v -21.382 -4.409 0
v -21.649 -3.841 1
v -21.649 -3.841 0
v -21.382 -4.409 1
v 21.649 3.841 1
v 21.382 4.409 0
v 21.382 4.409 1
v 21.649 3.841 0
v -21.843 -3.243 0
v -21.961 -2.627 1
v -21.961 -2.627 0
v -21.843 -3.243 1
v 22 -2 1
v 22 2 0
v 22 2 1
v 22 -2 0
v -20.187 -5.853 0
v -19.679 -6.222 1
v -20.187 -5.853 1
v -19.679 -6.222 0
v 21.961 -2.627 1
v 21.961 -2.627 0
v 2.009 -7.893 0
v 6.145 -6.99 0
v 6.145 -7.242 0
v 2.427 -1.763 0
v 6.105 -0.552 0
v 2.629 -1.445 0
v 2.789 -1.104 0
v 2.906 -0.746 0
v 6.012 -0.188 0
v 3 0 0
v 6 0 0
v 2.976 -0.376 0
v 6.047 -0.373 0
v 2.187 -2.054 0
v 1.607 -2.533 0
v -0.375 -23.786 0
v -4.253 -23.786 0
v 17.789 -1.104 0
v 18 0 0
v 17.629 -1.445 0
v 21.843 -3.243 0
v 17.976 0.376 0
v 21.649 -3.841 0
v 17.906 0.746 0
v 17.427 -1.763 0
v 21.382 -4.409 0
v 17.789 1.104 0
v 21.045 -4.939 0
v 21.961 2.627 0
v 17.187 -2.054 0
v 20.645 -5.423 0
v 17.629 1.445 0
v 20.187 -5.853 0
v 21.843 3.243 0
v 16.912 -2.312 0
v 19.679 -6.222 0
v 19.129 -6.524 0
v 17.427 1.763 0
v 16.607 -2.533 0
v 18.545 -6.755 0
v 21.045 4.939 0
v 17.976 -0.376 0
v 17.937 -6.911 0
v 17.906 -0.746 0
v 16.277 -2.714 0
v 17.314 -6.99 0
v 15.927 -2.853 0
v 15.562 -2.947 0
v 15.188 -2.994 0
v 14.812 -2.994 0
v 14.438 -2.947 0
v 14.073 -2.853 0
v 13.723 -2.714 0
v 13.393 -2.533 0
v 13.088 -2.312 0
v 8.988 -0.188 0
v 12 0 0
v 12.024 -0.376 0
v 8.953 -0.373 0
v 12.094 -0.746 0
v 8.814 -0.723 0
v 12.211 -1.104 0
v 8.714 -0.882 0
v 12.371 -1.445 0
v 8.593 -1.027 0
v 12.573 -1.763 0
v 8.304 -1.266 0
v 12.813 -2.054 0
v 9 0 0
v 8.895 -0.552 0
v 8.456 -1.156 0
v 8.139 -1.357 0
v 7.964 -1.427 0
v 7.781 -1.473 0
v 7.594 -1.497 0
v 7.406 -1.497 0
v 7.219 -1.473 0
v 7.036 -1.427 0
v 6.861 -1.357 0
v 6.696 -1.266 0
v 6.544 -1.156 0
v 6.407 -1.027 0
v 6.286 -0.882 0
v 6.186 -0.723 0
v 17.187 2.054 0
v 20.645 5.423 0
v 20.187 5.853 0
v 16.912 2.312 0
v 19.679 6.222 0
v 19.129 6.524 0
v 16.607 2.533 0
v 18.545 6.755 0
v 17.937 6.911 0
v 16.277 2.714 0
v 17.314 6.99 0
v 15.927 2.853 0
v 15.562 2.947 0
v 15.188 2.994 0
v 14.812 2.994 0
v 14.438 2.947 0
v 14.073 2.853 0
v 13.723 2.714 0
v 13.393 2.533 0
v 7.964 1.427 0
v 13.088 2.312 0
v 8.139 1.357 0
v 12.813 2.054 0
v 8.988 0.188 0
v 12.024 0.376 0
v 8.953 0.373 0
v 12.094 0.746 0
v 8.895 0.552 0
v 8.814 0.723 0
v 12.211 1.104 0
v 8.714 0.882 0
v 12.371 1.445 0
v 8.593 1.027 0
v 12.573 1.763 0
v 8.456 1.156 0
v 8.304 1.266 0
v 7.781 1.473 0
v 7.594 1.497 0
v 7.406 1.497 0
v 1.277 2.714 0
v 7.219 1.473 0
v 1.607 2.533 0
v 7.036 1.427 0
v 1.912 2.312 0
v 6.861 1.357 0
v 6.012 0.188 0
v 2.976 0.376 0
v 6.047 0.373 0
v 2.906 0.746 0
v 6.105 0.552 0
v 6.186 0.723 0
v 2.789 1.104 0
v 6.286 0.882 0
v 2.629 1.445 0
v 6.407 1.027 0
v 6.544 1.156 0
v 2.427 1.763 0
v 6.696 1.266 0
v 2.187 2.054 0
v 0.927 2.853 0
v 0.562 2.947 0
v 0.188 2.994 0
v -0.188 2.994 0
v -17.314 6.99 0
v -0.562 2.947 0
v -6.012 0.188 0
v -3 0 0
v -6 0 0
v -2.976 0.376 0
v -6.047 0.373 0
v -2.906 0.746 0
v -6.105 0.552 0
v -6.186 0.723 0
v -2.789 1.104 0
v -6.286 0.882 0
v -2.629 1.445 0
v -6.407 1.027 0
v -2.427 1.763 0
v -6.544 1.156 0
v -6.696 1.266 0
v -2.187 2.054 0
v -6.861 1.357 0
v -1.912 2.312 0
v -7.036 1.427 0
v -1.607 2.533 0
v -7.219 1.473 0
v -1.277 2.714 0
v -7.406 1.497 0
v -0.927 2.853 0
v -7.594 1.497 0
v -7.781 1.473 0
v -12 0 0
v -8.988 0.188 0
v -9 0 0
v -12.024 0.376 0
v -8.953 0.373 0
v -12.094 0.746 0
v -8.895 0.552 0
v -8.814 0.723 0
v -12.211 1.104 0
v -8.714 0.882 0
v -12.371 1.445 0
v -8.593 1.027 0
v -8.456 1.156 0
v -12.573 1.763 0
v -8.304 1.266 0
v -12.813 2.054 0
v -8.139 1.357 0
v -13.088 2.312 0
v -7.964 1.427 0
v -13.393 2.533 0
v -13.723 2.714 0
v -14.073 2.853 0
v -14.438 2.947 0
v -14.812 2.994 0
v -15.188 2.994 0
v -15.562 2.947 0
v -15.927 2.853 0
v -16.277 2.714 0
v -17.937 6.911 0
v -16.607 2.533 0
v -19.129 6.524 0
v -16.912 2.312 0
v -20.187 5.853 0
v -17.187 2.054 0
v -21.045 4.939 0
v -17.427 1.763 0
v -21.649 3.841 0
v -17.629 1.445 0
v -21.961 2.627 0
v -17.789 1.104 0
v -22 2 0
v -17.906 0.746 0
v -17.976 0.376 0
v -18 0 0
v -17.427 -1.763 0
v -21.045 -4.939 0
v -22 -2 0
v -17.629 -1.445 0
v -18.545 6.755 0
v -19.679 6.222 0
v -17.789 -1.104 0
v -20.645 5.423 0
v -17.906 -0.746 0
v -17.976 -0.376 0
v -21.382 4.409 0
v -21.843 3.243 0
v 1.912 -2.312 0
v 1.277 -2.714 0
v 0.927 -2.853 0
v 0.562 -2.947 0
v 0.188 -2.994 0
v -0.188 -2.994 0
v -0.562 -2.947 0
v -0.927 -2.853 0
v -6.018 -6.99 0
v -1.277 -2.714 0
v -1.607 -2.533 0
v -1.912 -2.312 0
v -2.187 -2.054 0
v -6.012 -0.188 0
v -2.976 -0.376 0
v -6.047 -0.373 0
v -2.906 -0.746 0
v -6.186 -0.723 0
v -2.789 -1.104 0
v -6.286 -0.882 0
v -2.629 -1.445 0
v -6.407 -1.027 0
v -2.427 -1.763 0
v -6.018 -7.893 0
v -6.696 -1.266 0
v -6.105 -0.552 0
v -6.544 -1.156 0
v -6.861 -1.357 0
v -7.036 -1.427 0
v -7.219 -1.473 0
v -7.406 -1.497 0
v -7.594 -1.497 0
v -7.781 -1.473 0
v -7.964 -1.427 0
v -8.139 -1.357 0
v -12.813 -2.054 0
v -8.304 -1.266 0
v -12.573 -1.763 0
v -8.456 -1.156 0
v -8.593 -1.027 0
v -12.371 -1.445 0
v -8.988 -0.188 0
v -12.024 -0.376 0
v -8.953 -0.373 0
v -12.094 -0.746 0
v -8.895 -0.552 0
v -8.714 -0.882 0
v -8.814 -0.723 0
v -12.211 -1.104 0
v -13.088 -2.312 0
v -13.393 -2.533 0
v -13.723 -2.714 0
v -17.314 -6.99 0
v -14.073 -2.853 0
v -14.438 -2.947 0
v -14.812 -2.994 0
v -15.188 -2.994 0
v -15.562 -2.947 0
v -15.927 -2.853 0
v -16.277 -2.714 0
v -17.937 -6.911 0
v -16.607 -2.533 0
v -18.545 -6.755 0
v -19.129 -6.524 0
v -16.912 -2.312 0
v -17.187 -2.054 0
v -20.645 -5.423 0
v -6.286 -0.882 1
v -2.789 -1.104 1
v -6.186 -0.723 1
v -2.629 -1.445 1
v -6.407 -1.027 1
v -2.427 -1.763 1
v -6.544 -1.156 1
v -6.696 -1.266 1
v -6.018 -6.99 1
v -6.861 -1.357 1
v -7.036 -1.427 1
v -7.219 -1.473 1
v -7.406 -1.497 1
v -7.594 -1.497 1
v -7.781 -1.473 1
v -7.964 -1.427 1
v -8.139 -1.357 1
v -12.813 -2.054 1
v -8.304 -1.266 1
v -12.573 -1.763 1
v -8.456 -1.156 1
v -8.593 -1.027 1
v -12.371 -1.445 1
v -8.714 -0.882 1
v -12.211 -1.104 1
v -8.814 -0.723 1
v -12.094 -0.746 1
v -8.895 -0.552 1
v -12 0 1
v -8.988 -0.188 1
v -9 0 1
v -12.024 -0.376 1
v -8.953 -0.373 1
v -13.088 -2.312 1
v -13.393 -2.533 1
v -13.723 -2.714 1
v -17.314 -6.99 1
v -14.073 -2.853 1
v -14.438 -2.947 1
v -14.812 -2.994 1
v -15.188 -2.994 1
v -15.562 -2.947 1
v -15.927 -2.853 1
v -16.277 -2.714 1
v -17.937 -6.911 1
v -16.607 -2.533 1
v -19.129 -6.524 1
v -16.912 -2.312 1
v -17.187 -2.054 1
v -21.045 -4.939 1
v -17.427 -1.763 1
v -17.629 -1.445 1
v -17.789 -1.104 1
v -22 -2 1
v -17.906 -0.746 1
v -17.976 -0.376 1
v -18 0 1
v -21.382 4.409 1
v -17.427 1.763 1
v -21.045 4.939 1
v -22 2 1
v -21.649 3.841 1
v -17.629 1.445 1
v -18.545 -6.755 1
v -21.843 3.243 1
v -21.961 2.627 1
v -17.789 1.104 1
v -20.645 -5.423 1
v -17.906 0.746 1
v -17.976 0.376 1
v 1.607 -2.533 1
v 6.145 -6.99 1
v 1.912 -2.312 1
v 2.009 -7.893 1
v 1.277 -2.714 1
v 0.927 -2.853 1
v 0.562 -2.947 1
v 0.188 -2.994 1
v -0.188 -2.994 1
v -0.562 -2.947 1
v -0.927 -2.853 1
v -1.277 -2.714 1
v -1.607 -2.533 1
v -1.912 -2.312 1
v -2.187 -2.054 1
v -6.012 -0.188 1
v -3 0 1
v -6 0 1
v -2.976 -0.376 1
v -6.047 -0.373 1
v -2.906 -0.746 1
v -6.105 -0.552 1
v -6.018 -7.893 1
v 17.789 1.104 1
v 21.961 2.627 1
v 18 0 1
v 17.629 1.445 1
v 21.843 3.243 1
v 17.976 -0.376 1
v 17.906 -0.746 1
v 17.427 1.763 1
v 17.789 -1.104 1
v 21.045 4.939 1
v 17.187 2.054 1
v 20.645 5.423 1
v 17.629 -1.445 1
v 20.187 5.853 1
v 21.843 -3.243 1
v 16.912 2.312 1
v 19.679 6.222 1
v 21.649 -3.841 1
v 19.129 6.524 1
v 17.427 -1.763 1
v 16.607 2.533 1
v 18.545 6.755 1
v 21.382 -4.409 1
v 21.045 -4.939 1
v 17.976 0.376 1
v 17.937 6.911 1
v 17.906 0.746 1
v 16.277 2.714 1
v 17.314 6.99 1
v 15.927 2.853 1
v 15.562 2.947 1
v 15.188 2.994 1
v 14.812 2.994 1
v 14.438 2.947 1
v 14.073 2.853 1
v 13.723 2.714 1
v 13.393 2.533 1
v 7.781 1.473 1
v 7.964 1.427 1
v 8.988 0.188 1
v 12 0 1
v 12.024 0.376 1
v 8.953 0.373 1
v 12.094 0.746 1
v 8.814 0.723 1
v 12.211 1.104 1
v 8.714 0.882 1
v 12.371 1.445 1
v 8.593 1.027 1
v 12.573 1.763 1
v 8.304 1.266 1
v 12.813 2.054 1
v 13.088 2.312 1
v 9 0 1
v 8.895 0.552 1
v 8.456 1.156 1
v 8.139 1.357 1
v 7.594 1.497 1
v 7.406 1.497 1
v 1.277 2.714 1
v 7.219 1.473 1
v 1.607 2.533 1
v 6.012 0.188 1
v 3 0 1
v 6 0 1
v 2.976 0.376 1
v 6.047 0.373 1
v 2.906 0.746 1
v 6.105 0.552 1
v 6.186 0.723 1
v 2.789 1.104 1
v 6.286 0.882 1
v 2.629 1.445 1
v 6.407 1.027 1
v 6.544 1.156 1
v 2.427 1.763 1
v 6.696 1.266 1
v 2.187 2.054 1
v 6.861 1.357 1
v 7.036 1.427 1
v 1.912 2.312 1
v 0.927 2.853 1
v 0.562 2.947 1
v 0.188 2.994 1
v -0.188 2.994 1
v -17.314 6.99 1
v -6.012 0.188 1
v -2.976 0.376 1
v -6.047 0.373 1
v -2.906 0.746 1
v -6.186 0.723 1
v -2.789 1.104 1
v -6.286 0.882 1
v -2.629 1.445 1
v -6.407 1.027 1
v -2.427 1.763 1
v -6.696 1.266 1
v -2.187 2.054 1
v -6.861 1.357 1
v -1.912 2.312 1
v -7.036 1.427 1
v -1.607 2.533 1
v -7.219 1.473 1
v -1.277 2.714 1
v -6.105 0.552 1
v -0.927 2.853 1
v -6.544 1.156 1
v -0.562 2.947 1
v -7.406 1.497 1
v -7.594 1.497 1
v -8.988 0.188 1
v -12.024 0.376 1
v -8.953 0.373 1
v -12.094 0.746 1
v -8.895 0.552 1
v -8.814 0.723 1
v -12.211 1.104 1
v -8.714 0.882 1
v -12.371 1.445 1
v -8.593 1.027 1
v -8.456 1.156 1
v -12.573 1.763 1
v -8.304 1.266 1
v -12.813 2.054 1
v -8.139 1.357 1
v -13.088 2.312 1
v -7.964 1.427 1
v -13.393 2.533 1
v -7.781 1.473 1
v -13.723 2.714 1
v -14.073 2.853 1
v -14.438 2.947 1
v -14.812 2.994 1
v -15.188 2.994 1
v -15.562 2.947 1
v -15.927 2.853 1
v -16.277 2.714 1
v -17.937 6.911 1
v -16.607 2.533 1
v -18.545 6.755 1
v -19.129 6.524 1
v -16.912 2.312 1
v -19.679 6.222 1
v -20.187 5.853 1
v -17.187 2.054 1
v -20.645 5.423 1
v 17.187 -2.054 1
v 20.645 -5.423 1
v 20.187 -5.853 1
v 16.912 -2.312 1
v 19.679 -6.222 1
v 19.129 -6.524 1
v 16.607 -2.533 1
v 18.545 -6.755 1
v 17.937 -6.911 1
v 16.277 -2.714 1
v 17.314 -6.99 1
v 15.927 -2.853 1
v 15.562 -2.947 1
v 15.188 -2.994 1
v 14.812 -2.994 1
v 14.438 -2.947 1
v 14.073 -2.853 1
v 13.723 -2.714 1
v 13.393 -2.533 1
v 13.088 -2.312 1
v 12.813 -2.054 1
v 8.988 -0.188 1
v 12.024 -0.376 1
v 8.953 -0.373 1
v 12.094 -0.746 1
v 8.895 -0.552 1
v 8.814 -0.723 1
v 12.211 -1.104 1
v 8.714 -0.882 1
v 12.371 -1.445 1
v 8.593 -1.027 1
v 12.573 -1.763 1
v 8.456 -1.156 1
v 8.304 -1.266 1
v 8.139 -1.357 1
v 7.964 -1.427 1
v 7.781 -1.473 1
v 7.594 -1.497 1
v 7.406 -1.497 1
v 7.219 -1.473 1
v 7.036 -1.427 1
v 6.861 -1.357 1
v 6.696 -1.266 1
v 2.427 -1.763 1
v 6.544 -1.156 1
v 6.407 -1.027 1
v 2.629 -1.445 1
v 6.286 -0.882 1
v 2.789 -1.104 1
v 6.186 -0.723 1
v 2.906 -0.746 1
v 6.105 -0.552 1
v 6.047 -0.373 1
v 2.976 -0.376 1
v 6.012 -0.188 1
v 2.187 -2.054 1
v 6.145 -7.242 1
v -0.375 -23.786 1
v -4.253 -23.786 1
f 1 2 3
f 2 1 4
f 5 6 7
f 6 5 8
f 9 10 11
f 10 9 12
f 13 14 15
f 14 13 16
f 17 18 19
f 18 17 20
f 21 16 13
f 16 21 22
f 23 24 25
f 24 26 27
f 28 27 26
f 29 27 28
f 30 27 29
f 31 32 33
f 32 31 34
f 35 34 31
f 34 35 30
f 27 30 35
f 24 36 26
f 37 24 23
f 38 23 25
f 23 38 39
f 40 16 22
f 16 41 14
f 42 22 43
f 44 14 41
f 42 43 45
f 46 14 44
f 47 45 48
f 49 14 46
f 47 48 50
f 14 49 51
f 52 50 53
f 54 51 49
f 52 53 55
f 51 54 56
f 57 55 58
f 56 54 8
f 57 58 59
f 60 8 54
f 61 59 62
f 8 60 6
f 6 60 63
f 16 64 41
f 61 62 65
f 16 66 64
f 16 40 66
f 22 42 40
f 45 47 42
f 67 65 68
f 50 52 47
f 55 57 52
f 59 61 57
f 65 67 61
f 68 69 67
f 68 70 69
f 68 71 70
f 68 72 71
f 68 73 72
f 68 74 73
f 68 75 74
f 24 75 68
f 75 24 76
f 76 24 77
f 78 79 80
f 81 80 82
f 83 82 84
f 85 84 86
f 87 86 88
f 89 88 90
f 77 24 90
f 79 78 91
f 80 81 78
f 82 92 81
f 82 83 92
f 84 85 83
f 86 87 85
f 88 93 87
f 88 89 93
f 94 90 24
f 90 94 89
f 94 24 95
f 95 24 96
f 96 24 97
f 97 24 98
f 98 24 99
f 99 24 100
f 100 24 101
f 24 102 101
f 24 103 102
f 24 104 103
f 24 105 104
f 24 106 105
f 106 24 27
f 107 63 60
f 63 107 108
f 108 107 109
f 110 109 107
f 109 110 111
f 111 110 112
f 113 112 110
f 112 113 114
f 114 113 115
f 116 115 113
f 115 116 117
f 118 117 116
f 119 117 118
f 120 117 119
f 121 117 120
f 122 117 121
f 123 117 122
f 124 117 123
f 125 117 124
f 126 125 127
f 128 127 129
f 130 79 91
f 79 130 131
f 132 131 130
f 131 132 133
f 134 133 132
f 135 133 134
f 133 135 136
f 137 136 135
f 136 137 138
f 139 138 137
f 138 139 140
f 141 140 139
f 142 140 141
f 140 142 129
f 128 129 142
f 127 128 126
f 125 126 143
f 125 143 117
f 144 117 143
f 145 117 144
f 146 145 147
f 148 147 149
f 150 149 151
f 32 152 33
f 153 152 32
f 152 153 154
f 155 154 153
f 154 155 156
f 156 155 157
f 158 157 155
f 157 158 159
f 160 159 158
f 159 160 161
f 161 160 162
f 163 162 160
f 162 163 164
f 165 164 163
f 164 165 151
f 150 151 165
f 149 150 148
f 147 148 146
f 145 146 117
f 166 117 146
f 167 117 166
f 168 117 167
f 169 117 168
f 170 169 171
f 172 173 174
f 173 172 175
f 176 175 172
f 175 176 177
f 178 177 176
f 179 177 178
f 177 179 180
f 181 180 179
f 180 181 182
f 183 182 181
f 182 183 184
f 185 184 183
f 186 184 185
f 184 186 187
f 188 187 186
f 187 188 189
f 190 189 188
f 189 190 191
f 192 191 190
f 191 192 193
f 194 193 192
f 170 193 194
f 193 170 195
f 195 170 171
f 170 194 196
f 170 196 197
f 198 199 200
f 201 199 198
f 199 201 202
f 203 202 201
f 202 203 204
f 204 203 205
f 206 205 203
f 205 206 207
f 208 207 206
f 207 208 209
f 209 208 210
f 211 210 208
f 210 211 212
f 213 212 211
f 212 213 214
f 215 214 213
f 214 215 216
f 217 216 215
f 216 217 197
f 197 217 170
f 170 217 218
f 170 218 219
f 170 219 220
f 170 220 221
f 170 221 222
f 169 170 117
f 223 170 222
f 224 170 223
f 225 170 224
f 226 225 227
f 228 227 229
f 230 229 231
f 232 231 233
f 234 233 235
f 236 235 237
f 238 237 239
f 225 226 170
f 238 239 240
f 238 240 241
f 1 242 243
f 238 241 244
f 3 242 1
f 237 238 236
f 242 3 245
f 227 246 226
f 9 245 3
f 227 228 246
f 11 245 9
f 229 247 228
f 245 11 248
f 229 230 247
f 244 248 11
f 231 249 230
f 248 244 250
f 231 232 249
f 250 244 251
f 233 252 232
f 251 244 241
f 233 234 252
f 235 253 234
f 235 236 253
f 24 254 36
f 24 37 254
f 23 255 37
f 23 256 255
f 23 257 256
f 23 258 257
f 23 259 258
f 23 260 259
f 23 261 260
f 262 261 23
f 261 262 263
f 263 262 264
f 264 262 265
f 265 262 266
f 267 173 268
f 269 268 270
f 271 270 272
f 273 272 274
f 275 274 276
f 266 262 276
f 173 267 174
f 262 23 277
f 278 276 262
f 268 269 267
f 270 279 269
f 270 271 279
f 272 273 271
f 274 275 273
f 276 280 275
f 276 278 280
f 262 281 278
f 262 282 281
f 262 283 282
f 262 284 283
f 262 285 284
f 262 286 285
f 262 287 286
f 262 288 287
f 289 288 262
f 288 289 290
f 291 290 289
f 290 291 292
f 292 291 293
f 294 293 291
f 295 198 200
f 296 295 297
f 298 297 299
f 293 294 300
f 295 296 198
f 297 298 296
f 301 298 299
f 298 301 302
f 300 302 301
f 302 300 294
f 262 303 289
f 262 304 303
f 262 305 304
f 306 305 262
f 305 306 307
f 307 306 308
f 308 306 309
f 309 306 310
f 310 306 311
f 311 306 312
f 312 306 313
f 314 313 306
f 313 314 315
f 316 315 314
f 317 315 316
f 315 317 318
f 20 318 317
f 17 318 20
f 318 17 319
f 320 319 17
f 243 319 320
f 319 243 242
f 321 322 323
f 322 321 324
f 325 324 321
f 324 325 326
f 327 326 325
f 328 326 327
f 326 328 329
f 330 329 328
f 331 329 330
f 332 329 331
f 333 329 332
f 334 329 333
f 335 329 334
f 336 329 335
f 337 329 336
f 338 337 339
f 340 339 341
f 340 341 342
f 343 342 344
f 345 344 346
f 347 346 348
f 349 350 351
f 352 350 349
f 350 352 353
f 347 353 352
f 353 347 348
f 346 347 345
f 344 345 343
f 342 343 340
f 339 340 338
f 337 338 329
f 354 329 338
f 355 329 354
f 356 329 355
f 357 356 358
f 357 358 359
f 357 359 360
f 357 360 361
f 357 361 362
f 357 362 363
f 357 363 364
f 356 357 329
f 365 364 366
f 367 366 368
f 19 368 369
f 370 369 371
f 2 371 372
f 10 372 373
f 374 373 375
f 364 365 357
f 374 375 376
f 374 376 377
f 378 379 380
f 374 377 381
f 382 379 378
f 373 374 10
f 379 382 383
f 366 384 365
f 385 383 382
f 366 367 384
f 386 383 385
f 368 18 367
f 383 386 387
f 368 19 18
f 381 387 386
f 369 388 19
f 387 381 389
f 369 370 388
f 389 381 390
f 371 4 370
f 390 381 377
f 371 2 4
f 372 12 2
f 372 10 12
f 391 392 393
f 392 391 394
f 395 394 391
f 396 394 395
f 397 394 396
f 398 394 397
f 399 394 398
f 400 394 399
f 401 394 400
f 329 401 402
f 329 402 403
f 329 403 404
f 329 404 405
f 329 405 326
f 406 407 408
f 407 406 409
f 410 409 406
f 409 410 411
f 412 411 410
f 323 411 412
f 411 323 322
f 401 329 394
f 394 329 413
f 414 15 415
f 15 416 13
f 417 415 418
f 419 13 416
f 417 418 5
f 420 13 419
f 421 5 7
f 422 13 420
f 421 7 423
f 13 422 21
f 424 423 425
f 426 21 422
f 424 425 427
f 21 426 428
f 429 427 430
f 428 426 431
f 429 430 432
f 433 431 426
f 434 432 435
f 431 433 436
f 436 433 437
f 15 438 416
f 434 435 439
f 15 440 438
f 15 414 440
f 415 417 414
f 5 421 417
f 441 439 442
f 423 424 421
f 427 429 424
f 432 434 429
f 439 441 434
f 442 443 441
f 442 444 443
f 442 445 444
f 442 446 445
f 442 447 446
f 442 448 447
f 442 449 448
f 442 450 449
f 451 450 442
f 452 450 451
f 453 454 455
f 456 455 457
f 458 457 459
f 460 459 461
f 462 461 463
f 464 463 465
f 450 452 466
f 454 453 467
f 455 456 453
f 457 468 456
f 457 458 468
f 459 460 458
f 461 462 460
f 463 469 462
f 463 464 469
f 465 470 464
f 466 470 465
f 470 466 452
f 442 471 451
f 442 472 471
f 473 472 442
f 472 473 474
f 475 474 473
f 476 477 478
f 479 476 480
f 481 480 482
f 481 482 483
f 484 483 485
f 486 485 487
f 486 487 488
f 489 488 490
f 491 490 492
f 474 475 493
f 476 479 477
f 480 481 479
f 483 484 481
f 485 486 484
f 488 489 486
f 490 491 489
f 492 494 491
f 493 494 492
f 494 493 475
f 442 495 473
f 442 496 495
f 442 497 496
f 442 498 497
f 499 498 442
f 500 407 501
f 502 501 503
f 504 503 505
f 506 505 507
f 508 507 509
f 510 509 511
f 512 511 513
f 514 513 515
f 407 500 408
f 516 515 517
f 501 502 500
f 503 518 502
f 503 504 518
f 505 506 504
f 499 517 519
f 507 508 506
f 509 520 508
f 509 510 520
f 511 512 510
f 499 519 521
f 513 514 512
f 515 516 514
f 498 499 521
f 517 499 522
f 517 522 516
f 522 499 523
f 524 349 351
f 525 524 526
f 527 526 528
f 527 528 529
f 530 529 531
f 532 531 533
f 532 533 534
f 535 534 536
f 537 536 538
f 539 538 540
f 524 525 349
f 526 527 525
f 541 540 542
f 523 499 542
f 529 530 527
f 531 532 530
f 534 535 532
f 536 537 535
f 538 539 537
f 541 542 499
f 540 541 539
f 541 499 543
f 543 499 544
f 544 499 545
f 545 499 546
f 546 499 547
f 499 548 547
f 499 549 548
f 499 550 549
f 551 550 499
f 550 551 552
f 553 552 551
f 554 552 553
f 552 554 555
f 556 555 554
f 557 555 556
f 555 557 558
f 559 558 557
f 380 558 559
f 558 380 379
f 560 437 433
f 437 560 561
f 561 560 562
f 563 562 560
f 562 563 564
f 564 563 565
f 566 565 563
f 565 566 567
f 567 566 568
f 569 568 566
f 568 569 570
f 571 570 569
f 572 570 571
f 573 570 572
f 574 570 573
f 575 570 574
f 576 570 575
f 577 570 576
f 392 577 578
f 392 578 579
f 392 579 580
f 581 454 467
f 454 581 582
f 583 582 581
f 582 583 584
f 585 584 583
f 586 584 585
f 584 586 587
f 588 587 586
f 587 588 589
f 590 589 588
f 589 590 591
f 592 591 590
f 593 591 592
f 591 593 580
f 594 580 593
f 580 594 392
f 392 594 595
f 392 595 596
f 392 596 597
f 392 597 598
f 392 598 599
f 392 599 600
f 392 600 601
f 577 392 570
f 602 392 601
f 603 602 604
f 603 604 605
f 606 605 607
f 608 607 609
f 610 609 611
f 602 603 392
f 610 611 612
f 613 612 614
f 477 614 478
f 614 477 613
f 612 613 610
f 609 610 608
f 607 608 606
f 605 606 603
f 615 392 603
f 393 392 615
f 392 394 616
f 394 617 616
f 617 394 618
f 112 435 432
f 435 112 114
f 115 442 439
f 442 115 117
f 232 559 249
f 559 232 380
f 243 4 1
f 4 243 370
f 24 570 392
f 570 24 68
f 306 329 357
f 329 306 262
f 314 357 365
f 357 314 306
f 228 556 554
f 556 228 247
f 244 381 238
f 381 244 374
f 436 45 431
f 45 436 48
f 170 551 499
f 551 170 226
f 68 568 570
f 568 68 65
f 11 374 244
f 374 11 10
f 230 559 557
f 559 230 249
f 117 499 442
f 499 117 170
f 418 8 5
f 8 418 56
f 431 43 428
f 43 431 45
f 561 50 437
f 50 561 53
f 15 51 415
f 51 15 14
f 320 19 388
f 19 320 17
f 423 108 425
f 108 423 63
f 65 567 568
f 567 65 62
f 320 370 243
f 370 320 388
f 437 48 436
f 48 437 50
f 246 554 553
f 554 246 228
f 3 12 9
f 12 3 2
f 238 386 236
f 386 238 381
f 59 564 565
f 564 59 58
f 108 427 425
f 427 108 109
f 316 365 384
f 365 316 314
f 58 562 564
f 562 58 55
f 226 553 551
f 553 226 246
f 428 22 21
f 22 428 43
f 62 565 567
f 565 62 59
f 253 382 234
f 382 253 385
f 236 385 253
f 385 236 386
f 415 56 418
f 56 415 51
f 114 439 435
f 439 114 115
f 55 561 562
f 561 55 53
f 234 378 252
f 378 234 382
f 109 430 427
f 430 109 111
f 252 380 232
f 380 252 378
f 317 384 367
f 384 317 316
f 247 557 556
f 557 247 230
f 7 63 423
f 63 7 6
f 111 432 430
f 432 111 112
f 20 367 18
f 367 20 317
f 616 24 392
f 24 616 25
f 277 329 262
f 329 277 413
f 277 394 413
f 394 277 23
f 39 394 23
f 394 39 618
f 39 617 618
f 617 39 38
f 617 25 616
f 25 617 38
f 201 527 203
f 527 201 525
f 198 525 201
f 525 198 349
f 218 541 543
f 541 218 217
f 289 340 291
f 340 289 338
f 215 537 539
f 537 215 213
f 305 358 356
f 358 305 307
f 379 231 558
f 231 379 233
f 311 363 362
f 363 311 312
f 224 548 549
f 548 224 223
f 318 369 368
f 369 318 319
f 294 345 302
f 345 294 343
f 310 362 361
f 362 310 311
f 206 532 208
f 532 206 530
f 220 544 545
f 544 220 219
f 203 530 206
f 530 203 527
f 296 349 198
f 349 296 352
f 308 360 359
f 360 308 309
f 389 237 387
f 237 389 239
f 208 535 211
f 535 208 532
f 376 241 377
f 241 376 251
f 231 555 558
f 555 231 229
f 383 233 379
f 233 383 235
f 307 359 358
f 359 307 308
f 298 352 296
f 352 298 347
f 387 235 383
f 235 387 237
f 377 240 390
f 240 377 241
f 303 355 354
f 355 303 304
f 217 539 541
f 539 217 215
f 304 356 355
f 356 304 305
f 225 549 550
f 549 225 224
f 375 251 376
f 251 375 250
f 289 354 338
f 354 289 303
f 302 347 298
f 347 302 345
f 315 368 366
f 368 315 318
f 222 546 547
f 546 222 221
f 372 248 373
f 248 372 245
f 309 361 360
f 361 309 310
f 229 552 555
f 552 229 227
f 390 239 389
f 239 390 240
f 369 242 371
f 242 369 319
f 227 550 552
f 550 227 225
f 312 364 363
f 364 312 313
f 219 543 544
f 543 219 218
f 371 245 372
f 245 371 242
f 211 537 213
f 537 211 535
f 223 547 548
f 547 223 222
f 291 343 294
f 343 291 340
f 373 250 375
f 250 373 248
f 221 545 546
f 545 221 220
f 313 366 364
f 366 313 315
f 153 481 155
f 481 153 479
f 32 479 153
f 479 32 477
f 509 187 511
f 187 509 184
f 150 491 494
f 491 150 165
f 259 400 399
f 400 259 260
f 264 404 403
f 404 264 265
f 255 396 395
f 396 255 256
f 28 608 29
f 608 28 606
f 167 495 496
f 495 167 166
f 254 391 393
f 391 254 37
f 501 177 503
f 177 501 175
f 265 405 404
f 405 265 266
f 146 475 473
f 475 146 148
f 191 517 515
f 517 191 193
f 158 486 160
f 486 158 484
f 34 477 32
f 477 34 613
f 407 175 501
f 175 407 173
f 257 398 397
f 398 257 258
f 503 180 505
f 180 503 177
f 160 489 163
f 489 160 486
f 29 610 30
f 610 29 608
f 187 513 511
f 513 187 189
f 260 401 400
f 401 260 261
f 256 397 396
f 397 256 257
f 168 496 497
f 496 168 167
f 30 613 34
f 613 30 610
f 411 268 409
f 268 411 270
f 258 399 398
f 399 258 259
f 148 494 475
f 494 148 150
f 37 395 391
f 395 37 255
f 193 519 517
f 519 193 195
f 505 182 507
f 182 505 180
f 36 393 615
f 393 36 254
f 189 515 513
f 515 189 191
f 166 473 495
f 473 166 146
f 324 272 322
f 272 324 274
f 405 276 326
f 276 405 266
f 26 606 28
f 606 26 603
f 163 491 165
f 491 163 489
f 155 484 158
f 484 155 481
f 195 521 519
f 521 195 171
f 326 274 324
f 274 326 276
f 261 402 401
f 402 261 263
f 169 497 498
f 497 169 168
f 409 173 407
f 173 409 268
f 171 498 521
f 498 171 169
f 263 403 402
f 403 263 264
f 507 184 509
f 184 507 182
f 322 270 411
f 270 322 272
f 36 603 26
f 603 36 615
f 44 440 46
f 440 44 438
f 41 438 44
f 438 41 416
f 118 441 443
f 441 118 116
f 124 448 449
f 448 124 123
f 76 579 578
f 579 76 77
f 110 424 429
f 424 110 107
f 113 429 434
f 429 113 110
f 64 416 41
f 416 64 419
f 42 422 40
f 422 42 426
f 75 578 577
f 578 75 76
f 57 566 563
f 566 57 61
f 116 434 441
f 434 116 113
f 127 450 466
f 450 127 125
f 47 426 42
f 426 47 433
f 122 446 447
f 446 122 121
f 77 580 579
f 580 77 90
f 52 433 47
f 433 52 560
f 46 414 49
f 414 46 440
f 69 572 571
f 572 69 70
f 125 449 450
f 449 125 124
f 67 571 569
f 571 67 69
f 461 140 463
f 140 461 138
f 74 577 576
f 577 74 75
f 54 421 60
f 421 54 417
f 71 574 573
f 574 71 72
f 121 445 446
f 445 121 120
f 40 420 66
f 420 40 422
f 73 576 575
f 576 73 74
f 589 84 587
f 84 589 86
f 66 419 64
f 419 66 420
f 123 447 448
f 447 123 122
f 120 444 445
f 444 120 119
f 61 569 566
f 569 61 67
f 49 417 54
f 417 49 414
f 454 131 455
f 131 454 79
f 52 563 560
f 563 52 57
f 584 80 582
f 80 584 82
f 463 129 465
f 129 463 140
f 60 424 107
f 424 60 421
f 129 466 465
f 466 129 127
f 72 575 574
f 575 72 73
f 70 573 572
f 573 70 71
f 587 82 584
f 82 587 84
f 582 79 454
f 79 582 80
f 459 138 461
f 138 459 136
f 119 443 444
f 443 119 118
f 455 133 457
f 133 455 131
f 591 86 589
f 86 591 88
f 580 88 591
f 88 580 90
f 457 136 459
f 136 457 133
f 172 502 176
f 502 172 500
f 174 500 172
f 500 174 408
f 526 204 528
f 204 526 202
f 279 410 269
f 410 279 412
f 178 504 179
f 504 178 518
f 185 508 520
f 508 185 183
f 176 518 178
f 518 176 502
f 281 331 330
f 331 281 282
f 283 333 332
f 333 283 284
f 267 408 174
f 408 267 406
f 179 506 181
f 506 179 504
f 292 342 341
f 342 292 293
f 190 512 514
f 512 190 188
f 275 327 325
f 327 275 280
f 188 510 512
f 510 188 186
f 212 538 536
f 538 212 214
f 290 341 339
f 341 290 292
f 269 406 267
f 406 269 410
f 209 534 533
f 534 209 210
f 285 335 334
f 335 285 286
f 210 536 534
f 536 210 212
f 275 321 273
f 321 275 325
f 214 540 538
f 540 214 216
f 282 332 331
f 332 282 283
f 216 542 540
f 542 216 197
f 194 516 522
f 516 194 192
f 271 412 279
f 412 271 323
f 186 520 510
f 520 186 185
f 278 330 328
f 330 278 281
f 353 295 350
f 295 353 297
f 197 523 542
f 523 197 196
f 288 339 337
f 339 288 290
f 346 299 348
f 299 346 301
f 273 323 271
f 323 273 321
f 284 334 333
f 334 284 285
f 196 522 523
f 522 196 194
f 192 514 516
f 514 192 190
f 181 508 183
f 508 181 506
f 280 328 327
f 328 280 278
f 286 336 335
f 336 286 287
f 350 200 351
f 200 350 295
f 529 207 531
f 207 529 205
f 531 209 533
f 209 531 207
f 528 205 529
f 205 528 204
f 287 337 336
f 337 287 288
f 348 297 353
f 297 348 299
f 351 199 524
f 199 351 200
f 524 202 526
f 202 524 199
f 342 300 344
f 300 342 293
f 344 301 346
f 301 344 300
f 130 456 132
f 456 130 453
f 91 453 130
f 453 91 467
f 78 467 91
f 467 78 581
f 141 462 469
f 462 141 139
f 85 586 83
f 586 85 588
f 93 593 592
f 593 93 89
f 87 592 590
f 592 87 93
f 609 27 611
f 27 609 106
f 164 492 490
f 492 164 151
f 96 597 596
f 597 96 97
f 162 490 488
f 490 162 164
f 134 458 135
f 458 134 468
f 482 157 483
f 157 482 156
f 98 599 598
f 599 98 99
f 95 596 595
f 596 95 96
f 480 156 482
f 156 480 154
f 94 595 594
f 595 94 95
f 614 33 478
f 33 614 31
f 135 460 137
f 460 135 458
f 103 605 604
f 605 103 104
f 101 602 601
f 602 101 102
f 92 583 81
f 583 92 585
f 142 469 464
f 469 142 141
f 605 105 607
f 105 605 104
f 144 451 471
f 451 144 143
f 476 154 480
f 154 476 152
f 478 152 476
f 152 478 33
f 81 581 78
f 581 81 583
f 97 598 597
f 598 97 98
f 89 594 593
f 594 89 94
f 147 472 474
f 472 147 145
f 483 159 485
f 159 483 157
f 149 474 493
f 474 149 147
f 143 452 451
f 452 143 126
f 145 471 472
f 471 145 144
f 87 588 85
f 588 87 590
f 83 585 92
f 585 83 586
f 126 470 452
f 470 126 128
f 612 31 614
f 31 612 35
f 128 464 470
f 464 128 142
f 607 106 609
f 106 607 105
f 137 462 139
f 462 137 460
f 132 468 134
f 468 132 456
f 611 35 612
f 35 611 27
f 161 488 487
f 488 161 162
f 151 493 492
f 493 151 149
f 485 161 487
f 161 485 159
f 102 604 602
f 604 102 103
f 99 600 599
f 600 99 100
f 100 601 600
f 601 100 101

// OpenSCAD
$fn = 50;


difference() {
	union() {
		hull() {
			translate(v = [-17.0000000000, 2.0000000000, 0]) {
				cylinder(h = 1, r = 5);
			}
			translate(v = [17.0000000000, 2.0000000000, 0]) {
				cylinder(h = 1, r = 5);
			}
			translate(v = [-17.0000000000, -2.0000000000, 0]) {
				cylinder(h = 1, r = 5);
			}
			translate(v = [17.0000000000, -2.0000000000, 0]) {
				cylinder(h = 1, r = 5);
			}
		}
		translate(v = [0, -5, 0]) {
			linear_extrude(height = 1) {
				text(font = "DejaVu Sans Mono:style=Bold", halign = "center", size = 19.0000000000, text = "7", valign = "top");
			}
		}
	}
	union() {
		translate(v = [-15.0000000000, 0.0000000000, 0]) {
			translate(v = [0, 0, -100]) {
				cylinder(h = 200, r = 3.0000000000);
			}
		}
		translate(v = [0, 0, -100]) {
			cylinder(h = 200, r = 3.0000000000);
		}
		translate(v = [15.0000000000, 0.0000000000, 0]) {
			translate(v = [0, 0, -100]) {
				cylinder(h = 200, r = 3.0000000000);
			}
		}
		translate(v = [-15.0000000000, 0.0000000000, 0]) {
			translate(v = [0, 0, -100]) {
				cylinder(h = 200, r = 1.5000000000);
			}
		}
		translate(v = [-7.5000000000, 0.0000000000, 0]) {
			translate(v = [0, 0, -100]) {
				cylinder(h = 200, r = 1.5000000000);
			}
		}
		translate(v = [0, 0, -100]) {
			cylinder(h = 200, r = 1.5000000000);
		}
		translate(v = [7.5000000000, 0.0000000000, 0]) {
			translate(v = [0, 0, -100]) {
				cylinder(h = 200, r = 1.5000000000);
			}
		}
		translate(v = [15.0000000000, 0.0000000000, 0]) {
			translate(v = [0, 0, -100]) {
				cylinder(h = 200, r = 1.5000000000);
			}
		}
	}
}
